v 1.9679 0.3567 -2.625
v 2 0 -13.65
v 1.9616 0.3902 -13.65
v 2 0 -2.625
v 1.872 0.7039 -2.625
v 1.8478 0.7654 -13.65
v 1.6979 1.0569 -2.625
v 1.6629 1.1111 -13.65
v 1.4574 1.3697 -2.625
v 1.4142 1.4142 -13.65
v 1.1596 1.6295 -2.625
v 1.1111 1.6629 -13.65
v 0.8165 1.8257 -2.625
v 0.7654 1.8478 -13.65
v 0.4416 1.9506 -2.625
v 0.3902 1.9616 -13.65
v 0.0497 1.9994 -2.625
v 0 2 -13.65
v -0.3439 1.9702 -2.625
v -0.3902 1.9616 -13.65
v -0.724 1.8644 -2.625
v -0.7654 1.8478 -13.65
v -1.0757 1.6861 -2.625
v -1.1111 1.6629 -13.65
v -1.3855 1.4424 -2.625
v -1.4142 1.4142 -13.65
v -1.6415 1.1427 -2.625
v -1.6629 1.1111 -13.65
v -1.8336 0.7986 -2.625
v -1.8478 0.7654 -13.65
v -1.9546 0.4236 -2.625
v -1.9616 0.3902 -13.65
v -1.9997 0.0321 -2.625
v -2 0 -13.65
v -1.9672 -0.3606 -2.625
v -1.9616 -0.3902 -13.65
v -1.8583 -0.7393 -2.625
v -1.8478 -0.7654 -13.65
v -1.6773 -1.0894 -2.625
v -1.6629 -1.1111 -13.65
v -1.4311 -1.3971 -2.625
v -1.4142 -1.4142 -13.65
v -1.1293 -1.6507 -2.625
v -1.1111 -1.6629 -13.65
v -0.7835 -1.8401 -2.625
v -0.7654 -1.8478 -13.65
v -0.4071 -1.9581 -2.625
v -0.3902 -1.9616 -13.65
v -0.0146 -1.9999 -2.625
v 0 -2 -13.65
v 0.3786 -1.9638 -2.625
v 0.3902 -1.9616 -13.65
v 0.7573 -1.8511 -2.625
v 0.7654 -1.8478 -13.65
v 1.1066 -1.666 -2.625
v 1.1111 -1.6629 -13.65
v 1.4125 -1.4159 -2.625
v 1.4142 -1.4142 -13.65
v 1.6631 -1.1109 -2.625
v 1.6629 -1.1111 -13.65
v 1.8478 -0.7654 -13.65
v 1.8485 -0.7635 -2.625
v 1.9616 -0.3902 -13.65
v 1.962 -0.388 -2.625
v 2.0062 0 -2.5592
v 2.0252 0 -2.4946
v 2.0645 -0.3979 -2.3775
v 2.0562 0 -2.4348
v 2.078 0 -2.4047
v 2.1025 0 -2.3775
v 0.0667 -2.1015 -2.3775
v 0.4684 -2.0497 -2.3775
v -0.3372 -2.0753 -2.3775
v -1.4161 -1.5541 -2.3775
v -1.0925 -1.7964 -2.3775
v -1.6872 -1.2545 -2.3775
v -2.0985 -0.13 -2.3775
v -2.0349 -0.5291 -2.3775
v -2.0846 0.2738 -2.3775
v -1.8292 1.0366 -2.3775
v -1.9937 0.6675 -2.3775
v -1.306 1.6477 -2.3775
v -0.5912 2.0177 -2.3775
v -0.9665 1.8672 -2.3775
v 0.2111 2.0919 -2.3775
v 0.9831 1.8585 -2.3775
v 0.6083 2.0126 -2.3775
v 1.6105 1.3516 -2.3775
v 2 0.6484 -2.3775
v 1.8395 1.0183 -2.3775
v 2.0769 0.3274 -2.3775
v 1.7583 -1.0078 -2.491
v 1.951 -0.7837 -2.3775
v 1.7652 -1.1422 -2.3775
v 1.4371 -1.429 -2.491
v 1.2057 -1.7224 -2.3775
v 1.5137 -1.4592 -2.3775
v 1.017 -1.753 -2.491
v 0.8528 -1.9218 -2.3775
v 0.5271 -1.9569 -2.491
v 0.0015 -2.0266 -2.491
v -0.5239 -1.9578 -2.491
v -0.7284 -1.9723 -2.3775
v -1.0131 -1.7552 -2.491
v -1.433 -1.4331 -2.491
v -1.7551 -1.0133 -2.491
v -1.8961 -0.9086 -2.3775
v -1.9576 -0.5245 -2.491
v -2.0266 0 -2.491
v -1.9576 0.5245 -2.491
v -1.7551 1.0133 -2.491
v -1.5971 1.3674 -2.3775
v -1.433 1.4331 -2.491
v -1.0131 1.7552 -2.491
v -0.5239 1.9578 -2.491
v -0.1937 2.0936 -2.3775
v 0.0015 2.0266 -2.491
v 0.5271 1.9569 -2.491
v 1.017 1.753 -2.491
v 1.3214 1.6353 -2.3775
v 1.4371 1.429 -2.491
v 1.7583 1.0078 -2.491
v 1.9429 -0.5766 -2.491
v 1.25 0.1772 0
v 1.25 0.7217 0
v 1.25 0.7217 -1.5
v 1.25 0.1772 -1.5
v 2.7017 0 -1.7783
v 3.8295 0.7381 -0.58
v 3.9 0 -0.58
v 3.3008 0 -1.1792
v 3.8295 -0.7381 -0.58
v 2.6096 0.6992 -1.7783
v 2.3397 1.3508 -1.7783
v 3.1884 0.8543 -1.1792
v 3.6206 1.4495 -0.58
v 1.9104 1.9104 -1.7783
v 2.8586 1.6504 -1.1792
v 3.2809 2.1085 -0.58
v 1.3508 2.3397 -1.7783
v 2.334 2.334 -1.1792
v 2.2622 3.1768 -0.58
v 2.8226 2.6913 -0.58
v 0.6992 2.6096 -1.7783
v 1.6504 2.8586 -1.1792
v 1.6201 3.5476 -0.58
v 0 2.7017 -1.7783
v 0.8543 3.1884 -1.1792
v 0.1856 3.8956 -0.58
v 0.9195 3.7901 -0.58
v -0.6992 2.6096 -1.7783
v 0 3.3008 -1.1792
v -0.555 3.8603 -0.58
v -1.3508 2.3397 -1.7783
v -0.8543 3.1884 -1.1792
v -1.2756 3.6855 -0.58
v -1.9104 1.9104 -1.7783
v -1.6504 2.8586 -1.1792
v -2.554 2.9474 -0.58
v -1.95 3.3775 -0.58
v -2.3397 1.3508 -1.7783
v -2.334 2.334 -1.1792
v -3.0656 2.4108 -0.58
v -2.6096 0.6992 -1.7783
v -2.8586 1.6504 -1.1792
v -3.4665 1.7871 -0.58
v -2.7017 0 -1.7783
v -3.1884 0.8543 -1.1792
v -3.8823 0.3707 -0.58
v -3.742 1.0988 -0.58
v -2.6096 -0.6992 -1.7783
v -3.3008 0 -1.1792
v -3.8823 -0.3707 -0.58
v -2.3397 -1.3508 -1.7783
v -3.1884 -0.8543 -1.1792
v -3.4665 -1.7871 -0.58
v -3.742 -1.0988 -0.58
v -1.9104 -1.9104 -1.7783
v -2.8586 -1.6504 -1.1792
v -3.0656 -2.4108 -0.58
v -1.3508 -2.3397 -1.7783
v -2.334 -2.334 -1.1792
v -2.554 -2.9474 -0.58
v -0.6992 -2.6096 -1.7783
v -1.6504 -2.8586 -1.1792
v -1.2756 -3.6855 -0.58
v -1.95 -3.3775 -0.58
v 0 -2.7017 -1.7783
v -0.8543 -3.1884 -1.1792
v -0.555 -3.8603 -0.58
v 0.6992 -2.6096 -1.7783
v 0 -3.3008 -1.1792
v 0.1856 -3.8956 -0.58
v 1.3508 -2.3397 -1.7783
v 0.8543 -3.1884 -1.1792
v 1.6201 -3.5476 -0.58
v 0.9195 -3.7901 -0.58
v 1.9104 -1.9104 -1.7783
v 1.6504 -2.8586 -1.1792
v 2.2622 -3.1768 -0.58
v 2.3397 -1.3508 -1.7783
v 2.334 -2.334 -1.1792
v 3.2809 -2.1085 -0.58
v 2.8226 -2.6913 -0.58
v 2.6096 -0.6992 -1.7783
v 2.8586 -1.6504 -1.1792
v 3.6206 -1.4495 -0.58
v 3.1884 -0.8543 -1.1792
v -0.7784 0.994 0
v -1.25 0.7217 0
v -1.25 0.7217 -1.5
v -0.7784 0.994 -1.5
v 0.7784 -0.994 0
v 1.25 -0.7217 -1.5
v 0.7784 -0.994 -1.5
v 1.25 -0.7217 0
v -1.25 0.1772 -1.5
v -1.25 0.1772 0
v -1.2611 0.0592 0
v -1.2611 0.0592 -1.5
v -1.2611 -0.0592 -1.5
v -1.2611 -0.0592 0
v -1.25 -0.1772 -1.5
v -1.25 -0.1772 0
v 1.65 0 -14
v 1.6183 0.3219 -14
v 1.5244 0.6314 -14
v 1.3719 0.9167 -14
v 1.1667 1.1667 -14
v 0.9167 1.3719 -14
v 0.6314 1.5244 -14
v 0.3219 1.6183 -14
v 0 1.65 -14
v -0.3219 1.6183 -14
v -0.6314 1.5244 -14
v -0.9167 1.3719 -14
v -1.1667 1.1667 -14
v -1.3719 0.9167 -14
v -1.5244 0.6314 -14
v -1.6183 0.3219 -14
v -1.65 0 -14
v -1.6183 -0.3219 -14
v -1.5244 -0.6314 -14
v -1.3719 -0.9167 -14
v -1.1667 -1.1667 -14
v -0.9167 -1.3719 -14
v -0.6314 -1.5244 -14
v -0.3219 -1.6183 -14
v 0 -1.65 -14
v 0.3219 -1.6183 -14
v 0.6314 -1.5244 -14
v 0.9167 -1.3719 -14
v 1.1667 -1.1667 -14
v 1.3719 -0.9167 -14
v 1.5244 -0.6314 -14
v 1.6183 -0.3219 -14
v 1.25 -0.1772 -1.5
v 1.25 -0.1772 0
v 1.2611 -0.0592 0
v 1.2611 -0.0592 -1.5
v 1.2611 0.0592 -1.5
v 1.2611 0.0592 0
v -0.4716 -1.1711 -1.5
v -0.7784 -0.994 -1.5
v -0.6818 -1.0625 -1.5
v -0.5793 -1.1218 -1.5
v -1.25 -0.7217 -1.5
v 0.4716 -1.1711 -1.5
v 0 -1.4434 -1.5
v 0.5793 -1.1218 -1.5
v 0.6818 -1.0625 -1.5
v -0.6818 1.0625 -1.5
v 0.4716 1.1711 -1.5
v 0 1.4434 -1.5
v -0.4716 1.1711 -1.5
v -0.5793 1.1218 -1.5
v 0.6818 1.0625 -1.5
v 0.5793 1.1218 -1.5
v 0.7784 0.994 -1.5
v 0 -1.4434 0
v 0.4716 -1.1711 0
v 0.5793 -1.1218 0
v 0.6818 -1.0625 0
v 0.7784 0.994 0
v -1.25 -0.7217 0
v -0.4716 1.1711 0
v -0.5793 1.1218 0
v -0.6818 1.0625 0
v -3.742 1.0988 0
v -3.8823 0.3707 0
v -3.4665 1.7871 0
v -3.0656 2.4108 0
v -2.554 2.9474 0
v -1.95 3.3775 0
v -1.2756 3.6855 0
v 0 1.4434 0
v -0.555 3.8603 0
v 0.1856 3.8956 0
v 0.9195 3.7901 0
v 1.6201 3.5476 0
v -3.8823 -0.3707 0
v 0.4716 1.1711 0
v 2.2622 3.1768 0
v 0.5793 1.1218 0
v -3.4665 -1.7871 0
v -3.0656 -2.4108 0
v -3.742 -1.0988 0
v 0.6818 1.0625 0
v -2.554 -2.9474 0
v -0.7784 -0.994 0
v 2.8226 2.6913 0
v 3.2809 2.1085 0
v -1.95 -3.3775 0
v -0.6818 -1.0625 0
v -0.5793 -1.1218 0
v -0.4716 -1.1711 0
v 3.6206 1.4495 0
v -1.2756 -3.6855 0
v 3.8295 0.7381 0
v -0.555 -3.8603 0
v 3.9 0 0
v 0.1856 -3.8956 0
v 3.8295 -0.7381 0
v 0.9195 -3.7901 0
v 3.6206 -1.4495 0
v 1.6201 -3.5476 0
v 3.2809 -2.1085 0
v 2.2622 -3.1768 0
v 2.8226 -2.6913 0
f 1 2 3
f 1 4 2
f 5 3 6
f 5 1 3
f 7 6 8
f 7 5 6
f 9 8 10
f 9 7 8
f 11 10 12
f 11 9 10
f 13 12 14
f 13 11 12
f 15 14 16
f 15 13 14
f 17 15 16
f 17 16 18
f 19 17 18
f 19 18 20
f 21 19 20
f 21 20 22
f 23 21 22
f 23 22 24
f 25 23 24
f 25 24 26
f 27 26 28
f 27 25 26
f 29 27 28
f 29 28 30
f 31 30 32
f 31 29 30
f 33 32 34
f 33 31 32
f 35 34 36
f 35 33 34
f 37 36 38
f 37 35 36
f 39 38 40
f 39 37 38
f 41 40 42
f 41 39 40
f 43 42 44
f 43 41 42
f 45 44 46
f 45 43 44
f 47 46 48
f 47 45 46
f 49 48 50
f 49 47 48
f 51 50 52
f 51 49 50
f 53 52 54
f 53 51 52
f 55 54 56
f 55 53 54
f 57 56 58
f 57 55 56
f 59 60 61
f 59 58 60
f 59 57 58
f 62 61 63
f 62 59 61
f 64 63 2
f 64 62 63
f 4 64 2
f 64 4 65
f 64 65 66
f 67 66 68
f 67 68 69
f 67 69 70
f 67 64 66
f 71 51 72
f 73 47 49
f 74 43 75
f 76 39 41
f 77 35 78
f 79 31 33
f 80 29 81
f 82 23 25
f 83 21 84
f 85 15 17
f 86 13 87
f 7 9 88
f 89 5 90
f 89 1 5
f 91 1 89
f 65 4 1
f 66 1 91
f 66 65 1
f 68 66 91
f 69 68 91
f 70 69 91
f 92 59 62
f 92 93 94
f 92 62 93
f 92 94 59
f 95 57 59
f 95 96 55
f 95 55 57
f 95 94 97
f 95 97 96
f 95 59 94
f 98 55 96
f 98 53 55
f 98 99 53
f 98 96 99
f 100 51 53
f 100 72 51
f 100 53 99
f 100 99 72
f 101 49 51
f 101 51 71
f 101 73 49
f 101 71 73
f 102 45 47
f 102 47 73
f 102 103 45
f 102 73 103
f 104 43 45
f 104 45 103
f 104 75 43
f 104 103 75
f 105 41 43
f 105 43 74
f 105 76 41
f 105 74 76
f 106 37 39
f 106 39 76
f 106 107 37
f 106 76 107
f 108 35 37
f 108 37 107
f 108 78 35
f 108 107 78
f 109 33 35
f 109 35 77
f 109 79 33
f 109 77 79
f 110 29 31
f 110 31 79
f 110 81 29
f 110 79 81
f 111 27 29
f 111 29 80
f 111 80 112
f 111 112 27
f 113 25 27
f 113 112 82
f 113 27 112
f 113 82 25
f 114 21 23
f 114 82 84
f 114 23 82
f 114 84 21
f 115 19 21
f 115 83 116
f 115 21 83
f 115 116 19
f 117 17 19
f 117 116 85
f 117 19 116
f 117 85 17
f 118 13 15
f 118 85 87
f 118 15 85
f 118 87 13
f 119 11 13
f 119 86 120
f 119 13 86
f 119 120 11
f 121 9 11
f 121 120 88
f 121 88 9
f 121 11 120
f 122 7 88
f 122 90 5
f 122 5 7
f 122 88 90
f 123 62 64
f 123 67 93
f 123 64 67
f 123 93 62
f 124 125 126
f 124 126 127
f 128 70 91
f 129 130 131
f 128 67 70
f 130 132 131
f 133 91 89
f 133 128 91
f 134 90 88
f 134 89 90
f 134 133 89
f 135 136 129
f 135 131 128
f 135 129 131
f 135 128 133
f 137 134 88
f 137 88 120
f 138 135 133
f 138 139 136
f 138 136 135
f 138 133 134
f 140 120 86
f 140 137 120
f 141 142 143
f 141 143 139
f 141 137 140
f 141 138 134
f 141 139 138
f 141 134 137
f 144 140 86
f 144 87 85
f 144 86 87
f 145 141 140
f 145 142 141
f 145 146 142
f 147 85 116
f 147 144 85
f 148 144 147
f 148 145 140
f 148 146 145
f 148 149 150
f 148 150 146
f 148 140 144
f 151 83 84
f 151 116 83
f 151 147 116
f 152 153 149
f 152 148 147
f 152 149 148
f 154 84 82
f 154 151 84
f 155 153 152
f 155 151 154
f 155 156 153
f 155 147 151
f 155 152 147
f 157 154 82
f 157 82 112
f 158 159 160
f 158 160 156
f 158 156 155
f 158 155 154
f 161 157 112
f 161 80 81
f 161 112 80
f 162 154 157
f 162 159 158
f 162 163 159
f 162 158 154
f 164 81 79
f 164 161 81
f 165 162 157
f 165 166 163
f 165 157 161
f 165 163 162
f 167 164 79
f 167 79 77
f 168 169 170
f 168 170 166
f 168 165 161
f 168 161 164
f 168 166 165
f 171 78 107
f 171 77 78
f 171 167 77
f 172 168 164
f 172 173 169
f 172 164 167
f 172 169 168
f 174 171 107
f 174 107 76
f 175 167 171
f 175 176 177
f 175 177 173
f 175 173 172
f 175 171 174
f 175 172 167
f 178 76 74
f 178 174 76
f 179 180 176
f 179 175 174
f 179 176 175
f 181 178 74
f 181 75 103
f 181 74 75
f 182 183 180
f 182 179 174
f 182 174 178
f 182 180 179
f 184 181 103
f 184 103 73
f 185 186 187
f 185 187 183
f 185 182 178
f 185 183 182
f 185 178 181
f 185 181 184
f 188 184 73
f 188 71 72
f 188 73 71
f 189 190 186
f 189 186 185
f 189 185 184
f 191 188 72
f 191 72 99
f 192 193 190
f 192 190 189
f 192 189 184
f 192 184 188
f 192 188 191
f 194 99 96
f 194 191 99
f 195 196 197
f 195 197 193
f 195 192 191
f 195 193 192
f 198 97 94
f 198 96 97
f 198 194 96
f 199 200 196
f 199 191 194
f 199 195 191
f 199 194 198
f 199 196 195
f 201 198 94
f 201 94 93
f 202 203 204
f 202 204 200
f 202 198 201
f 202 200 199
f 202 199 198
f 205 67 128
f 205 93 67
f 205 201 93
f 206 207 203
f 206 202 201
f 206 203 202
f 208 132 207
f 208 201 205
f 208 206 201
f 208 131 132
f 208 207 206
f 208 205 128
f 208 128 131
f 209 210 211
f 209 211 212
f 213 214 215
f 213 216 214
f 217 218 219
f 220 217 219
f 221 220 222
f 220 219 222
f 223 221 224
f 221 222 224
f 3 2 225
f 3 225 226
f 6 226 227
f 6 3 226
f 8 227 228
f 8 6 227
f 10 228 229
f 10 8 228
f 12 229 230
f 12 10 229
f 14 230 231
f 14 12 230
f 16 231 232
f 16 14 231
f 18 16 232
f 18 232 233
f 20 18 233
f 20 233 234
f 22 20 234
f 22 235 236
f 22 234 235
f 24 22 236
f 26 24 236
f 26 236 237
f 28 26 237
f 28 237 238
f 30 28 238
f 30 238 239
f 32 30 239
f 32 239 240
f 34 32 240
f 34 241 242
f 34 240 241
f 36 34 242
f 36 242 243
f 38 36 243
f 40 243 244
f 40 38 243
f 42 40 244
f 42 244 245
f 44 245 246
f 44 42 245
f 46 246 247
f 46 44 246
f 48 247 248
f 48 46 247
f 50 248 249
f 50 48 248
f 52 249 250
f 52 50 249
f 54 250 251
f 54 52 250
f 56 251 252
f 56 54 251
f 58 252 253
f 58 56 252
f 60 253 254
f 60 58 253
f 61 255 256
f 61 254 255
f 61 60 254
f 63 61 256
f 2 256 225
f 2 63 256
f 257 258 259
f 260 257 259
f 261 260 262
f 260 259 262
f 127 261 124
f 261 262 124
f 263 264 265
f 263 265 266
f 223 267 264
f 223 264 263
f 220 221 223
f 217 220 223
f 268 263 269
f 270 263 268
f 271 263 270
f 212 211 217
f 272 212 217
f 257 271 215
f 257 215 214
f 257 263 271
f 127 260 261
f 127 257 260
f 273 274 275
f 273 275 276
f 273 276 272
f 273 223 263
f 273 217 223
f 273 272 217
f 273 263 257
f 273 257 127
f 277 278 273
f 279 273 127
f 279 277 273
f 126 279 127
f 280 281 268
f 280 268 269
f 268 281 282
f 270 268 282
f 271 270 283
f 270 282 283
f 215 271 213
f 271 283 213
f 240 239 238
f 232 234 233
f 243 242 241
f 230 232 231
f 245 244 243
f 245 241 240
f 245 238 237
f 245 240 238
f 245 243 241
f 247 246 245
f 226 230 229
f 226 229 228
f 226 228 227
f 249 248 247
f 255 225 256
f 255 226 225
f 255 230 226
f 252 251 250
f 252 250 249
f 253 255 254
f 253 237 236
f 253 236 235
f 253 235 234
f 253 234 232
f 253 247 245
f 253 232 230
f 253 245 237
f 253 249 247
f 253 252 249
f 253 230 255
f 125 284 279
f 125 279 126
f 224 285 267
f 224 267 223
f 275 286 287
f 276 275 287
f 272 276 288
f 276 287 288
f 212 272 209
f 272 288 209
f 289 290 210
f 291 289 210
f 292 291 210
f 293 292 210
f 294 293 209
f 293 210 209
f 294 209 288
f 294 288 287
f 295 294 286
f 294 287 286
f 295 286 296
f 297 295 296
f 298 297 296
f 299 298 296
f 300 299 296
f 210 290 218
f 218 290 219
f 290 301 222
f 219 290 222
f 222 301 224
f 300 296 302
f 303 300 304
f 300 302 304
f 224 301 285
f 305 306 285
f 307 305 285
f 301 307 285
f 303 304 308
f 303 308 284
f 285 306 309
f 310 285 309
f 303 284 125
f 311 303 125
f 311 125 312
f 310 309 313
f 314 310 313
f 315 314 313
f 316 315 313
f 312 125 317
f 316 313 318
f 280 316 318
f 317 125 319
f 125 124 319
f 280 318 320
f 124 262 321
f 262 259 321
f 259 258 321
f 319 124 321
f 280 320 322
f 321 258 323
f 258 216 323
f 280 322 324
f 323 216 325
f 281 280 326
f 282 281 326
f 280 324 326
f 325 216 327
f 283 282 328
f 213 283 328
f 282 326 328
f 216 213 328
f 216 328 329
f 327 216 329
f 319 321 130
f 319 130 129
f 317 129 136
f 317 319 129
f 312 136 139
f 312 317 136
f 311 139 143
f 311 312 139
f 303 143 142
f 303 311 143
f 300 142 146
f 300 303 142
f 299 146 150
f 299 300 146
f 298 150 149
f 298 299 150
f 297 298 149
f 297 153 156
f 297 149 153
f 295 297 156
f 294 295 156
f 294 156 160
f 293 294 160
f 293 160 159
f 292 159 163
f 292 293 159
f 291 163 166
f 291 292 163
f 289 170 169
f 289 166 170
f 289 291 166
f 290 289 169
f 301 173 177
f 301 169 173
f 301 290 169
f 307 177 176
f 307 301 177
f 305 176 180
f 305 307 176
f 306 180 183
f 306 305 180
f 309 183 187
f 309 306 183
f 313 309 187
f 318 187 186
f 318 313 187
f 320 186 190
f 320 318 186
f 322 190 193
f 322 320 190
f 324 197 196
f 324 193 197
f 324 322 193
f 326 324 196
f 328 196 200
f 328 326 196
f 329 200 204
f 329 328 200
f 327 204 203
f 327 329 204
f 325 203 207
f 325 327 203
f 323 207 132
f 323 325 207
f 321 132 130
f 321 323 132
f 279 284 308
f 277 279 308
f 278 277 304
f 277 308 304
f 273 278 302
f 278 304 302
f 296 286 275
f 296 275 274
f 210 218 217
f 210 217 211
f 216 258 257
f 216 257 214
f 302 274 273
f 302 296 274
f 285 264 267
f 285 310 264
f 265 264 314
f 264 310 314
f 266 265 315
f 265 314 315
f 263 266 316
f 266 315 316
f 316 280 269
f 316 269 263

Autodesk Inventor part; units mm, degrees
ref_plane "YZ Plane" through (0, 0, 0) normal (1, 0, 0) x (0, 1, 0)
sketch "Sketch2" plane through (0, 0, 0) normal (0, 1, 0) x (-1, 0, 0)
  line L0 (0, -14) -> (-2, -14)
  line L1 (0, 0) -> (0, -14)
  line L2 (-3.9, 0) -> (0, 0)
  line L3 (-3.9, -0.58) -> (-3.9, 0)
  line L4 (-2, -2.48) -> (-3.9, -0.58)
  line L5 (-2, -14) -> (-2, -2.48)
  line L6 (0, 0) -> (0, -14)
  dimension "d2" = 45
  dimension "d4" = 2
  dimension "d6" = 3.9
  dimension "d8" = 2.48
  dimension "d10" = 14
revolve "Revolution1" add sketch "Sketch2" angle 360 about axis through (0, 0, 0) along (0, 0, -1)
fillet "Fillet1" radius 0.35 1 edges at (-2, 0, -2.48)
chamfer "Chamfer1" distance 0.35 angle 45 1 edges at (-2, 0, -14)
sketch "Sketch4" plane through (0, 0, 0) normal (0, 0, 1) x (1, 0, 0)
  circle A0 centre (0, 0) radius 3.9 projected
  circle A1 centre (0, 0) radius 1.25 construction
  line L0 (-1.25, -0.7217) -> (-1.25, 0.7217)
  line L1 (-1.25, 0.7217) -> (0, 1.4434)
  line L2 (0, 1.4434) -> (1.25, 0.7217)
  line L3 (1.25, 0.7217) -> (1.25, -0.7217)
  line L4 (1.25, -0.7217) -> (0, -1.4434)
  line L5 (0, -1.4434) -> (-1.25, -0.7217)
  dimension "d27" = 2.5
extrude "Extrusion1" cut sketch "Sketch4" against normal blind 1.5 contours L0 L1 L2 L3 L4 L5
sketch "Sketch5" plane through (0, 0, 0) normal (0, 0, 1) x (1, 0, 0)
  circle A0 centre (0, 0) radius 3.9 projected
  circle A1 centre (0, 0) radius 1.2625
  dimension "d38" = 2.525
extrude "Extrusion2" cut sketch "Sketch5" against normal blind 1.5 contours A1
thread "Thread1" size "M4x0.7" class "4g6g" standard "ANSI Metric M Profile" length 10.12
ref_plane "MSC_PF1" through (0, 0, 0) normal (1, 0, 0) x (0, 1, 0)
ref_plane "MSC_PT1" through (3.9, 0, -0.58) normal (0, 0, -1) x (-1, 0, 0)
equation "\"d24\" = Rr"
equation "\"d25\" = 0.5 * PTC"
equation "\"d26\" = 0.5 * PTC"
equation "\"d38\" = 1.01 * ParJ"
equation "\"d39\" = Tt"
equation "\"d4\" = 0.5 * NND"
equation "\"d6\" = 0.5 * ParA"
equation "\"d8\" = ParH"
equation "\"d10\" = NLG"
equation "\"d27\" = ParJ"
equation "\"d28\" = Tt"
equation "\"d31\" = Lt"
equation "\"NND\" = 4"
equation "\"NLG\" = 14"
equation "\"PTC\" = 0.7"
equation "\"ParA\" = 7.8"
equation "\"ParH\" = 2.48"
equation "\"ParJ\" = 2.5"
equation "\"Tt\" = 1.5"
equation "\"Rr\" = 0.35"
equation "\"msp_e\" = 0.288675 * ParJ"
equation "\"Lt\" = 10.12"
equation "\"THREADDIA\" = NND"
properties part number "ASME/ANSI B18.3.5M - M4x14(2)" material "Steel, Mild"
